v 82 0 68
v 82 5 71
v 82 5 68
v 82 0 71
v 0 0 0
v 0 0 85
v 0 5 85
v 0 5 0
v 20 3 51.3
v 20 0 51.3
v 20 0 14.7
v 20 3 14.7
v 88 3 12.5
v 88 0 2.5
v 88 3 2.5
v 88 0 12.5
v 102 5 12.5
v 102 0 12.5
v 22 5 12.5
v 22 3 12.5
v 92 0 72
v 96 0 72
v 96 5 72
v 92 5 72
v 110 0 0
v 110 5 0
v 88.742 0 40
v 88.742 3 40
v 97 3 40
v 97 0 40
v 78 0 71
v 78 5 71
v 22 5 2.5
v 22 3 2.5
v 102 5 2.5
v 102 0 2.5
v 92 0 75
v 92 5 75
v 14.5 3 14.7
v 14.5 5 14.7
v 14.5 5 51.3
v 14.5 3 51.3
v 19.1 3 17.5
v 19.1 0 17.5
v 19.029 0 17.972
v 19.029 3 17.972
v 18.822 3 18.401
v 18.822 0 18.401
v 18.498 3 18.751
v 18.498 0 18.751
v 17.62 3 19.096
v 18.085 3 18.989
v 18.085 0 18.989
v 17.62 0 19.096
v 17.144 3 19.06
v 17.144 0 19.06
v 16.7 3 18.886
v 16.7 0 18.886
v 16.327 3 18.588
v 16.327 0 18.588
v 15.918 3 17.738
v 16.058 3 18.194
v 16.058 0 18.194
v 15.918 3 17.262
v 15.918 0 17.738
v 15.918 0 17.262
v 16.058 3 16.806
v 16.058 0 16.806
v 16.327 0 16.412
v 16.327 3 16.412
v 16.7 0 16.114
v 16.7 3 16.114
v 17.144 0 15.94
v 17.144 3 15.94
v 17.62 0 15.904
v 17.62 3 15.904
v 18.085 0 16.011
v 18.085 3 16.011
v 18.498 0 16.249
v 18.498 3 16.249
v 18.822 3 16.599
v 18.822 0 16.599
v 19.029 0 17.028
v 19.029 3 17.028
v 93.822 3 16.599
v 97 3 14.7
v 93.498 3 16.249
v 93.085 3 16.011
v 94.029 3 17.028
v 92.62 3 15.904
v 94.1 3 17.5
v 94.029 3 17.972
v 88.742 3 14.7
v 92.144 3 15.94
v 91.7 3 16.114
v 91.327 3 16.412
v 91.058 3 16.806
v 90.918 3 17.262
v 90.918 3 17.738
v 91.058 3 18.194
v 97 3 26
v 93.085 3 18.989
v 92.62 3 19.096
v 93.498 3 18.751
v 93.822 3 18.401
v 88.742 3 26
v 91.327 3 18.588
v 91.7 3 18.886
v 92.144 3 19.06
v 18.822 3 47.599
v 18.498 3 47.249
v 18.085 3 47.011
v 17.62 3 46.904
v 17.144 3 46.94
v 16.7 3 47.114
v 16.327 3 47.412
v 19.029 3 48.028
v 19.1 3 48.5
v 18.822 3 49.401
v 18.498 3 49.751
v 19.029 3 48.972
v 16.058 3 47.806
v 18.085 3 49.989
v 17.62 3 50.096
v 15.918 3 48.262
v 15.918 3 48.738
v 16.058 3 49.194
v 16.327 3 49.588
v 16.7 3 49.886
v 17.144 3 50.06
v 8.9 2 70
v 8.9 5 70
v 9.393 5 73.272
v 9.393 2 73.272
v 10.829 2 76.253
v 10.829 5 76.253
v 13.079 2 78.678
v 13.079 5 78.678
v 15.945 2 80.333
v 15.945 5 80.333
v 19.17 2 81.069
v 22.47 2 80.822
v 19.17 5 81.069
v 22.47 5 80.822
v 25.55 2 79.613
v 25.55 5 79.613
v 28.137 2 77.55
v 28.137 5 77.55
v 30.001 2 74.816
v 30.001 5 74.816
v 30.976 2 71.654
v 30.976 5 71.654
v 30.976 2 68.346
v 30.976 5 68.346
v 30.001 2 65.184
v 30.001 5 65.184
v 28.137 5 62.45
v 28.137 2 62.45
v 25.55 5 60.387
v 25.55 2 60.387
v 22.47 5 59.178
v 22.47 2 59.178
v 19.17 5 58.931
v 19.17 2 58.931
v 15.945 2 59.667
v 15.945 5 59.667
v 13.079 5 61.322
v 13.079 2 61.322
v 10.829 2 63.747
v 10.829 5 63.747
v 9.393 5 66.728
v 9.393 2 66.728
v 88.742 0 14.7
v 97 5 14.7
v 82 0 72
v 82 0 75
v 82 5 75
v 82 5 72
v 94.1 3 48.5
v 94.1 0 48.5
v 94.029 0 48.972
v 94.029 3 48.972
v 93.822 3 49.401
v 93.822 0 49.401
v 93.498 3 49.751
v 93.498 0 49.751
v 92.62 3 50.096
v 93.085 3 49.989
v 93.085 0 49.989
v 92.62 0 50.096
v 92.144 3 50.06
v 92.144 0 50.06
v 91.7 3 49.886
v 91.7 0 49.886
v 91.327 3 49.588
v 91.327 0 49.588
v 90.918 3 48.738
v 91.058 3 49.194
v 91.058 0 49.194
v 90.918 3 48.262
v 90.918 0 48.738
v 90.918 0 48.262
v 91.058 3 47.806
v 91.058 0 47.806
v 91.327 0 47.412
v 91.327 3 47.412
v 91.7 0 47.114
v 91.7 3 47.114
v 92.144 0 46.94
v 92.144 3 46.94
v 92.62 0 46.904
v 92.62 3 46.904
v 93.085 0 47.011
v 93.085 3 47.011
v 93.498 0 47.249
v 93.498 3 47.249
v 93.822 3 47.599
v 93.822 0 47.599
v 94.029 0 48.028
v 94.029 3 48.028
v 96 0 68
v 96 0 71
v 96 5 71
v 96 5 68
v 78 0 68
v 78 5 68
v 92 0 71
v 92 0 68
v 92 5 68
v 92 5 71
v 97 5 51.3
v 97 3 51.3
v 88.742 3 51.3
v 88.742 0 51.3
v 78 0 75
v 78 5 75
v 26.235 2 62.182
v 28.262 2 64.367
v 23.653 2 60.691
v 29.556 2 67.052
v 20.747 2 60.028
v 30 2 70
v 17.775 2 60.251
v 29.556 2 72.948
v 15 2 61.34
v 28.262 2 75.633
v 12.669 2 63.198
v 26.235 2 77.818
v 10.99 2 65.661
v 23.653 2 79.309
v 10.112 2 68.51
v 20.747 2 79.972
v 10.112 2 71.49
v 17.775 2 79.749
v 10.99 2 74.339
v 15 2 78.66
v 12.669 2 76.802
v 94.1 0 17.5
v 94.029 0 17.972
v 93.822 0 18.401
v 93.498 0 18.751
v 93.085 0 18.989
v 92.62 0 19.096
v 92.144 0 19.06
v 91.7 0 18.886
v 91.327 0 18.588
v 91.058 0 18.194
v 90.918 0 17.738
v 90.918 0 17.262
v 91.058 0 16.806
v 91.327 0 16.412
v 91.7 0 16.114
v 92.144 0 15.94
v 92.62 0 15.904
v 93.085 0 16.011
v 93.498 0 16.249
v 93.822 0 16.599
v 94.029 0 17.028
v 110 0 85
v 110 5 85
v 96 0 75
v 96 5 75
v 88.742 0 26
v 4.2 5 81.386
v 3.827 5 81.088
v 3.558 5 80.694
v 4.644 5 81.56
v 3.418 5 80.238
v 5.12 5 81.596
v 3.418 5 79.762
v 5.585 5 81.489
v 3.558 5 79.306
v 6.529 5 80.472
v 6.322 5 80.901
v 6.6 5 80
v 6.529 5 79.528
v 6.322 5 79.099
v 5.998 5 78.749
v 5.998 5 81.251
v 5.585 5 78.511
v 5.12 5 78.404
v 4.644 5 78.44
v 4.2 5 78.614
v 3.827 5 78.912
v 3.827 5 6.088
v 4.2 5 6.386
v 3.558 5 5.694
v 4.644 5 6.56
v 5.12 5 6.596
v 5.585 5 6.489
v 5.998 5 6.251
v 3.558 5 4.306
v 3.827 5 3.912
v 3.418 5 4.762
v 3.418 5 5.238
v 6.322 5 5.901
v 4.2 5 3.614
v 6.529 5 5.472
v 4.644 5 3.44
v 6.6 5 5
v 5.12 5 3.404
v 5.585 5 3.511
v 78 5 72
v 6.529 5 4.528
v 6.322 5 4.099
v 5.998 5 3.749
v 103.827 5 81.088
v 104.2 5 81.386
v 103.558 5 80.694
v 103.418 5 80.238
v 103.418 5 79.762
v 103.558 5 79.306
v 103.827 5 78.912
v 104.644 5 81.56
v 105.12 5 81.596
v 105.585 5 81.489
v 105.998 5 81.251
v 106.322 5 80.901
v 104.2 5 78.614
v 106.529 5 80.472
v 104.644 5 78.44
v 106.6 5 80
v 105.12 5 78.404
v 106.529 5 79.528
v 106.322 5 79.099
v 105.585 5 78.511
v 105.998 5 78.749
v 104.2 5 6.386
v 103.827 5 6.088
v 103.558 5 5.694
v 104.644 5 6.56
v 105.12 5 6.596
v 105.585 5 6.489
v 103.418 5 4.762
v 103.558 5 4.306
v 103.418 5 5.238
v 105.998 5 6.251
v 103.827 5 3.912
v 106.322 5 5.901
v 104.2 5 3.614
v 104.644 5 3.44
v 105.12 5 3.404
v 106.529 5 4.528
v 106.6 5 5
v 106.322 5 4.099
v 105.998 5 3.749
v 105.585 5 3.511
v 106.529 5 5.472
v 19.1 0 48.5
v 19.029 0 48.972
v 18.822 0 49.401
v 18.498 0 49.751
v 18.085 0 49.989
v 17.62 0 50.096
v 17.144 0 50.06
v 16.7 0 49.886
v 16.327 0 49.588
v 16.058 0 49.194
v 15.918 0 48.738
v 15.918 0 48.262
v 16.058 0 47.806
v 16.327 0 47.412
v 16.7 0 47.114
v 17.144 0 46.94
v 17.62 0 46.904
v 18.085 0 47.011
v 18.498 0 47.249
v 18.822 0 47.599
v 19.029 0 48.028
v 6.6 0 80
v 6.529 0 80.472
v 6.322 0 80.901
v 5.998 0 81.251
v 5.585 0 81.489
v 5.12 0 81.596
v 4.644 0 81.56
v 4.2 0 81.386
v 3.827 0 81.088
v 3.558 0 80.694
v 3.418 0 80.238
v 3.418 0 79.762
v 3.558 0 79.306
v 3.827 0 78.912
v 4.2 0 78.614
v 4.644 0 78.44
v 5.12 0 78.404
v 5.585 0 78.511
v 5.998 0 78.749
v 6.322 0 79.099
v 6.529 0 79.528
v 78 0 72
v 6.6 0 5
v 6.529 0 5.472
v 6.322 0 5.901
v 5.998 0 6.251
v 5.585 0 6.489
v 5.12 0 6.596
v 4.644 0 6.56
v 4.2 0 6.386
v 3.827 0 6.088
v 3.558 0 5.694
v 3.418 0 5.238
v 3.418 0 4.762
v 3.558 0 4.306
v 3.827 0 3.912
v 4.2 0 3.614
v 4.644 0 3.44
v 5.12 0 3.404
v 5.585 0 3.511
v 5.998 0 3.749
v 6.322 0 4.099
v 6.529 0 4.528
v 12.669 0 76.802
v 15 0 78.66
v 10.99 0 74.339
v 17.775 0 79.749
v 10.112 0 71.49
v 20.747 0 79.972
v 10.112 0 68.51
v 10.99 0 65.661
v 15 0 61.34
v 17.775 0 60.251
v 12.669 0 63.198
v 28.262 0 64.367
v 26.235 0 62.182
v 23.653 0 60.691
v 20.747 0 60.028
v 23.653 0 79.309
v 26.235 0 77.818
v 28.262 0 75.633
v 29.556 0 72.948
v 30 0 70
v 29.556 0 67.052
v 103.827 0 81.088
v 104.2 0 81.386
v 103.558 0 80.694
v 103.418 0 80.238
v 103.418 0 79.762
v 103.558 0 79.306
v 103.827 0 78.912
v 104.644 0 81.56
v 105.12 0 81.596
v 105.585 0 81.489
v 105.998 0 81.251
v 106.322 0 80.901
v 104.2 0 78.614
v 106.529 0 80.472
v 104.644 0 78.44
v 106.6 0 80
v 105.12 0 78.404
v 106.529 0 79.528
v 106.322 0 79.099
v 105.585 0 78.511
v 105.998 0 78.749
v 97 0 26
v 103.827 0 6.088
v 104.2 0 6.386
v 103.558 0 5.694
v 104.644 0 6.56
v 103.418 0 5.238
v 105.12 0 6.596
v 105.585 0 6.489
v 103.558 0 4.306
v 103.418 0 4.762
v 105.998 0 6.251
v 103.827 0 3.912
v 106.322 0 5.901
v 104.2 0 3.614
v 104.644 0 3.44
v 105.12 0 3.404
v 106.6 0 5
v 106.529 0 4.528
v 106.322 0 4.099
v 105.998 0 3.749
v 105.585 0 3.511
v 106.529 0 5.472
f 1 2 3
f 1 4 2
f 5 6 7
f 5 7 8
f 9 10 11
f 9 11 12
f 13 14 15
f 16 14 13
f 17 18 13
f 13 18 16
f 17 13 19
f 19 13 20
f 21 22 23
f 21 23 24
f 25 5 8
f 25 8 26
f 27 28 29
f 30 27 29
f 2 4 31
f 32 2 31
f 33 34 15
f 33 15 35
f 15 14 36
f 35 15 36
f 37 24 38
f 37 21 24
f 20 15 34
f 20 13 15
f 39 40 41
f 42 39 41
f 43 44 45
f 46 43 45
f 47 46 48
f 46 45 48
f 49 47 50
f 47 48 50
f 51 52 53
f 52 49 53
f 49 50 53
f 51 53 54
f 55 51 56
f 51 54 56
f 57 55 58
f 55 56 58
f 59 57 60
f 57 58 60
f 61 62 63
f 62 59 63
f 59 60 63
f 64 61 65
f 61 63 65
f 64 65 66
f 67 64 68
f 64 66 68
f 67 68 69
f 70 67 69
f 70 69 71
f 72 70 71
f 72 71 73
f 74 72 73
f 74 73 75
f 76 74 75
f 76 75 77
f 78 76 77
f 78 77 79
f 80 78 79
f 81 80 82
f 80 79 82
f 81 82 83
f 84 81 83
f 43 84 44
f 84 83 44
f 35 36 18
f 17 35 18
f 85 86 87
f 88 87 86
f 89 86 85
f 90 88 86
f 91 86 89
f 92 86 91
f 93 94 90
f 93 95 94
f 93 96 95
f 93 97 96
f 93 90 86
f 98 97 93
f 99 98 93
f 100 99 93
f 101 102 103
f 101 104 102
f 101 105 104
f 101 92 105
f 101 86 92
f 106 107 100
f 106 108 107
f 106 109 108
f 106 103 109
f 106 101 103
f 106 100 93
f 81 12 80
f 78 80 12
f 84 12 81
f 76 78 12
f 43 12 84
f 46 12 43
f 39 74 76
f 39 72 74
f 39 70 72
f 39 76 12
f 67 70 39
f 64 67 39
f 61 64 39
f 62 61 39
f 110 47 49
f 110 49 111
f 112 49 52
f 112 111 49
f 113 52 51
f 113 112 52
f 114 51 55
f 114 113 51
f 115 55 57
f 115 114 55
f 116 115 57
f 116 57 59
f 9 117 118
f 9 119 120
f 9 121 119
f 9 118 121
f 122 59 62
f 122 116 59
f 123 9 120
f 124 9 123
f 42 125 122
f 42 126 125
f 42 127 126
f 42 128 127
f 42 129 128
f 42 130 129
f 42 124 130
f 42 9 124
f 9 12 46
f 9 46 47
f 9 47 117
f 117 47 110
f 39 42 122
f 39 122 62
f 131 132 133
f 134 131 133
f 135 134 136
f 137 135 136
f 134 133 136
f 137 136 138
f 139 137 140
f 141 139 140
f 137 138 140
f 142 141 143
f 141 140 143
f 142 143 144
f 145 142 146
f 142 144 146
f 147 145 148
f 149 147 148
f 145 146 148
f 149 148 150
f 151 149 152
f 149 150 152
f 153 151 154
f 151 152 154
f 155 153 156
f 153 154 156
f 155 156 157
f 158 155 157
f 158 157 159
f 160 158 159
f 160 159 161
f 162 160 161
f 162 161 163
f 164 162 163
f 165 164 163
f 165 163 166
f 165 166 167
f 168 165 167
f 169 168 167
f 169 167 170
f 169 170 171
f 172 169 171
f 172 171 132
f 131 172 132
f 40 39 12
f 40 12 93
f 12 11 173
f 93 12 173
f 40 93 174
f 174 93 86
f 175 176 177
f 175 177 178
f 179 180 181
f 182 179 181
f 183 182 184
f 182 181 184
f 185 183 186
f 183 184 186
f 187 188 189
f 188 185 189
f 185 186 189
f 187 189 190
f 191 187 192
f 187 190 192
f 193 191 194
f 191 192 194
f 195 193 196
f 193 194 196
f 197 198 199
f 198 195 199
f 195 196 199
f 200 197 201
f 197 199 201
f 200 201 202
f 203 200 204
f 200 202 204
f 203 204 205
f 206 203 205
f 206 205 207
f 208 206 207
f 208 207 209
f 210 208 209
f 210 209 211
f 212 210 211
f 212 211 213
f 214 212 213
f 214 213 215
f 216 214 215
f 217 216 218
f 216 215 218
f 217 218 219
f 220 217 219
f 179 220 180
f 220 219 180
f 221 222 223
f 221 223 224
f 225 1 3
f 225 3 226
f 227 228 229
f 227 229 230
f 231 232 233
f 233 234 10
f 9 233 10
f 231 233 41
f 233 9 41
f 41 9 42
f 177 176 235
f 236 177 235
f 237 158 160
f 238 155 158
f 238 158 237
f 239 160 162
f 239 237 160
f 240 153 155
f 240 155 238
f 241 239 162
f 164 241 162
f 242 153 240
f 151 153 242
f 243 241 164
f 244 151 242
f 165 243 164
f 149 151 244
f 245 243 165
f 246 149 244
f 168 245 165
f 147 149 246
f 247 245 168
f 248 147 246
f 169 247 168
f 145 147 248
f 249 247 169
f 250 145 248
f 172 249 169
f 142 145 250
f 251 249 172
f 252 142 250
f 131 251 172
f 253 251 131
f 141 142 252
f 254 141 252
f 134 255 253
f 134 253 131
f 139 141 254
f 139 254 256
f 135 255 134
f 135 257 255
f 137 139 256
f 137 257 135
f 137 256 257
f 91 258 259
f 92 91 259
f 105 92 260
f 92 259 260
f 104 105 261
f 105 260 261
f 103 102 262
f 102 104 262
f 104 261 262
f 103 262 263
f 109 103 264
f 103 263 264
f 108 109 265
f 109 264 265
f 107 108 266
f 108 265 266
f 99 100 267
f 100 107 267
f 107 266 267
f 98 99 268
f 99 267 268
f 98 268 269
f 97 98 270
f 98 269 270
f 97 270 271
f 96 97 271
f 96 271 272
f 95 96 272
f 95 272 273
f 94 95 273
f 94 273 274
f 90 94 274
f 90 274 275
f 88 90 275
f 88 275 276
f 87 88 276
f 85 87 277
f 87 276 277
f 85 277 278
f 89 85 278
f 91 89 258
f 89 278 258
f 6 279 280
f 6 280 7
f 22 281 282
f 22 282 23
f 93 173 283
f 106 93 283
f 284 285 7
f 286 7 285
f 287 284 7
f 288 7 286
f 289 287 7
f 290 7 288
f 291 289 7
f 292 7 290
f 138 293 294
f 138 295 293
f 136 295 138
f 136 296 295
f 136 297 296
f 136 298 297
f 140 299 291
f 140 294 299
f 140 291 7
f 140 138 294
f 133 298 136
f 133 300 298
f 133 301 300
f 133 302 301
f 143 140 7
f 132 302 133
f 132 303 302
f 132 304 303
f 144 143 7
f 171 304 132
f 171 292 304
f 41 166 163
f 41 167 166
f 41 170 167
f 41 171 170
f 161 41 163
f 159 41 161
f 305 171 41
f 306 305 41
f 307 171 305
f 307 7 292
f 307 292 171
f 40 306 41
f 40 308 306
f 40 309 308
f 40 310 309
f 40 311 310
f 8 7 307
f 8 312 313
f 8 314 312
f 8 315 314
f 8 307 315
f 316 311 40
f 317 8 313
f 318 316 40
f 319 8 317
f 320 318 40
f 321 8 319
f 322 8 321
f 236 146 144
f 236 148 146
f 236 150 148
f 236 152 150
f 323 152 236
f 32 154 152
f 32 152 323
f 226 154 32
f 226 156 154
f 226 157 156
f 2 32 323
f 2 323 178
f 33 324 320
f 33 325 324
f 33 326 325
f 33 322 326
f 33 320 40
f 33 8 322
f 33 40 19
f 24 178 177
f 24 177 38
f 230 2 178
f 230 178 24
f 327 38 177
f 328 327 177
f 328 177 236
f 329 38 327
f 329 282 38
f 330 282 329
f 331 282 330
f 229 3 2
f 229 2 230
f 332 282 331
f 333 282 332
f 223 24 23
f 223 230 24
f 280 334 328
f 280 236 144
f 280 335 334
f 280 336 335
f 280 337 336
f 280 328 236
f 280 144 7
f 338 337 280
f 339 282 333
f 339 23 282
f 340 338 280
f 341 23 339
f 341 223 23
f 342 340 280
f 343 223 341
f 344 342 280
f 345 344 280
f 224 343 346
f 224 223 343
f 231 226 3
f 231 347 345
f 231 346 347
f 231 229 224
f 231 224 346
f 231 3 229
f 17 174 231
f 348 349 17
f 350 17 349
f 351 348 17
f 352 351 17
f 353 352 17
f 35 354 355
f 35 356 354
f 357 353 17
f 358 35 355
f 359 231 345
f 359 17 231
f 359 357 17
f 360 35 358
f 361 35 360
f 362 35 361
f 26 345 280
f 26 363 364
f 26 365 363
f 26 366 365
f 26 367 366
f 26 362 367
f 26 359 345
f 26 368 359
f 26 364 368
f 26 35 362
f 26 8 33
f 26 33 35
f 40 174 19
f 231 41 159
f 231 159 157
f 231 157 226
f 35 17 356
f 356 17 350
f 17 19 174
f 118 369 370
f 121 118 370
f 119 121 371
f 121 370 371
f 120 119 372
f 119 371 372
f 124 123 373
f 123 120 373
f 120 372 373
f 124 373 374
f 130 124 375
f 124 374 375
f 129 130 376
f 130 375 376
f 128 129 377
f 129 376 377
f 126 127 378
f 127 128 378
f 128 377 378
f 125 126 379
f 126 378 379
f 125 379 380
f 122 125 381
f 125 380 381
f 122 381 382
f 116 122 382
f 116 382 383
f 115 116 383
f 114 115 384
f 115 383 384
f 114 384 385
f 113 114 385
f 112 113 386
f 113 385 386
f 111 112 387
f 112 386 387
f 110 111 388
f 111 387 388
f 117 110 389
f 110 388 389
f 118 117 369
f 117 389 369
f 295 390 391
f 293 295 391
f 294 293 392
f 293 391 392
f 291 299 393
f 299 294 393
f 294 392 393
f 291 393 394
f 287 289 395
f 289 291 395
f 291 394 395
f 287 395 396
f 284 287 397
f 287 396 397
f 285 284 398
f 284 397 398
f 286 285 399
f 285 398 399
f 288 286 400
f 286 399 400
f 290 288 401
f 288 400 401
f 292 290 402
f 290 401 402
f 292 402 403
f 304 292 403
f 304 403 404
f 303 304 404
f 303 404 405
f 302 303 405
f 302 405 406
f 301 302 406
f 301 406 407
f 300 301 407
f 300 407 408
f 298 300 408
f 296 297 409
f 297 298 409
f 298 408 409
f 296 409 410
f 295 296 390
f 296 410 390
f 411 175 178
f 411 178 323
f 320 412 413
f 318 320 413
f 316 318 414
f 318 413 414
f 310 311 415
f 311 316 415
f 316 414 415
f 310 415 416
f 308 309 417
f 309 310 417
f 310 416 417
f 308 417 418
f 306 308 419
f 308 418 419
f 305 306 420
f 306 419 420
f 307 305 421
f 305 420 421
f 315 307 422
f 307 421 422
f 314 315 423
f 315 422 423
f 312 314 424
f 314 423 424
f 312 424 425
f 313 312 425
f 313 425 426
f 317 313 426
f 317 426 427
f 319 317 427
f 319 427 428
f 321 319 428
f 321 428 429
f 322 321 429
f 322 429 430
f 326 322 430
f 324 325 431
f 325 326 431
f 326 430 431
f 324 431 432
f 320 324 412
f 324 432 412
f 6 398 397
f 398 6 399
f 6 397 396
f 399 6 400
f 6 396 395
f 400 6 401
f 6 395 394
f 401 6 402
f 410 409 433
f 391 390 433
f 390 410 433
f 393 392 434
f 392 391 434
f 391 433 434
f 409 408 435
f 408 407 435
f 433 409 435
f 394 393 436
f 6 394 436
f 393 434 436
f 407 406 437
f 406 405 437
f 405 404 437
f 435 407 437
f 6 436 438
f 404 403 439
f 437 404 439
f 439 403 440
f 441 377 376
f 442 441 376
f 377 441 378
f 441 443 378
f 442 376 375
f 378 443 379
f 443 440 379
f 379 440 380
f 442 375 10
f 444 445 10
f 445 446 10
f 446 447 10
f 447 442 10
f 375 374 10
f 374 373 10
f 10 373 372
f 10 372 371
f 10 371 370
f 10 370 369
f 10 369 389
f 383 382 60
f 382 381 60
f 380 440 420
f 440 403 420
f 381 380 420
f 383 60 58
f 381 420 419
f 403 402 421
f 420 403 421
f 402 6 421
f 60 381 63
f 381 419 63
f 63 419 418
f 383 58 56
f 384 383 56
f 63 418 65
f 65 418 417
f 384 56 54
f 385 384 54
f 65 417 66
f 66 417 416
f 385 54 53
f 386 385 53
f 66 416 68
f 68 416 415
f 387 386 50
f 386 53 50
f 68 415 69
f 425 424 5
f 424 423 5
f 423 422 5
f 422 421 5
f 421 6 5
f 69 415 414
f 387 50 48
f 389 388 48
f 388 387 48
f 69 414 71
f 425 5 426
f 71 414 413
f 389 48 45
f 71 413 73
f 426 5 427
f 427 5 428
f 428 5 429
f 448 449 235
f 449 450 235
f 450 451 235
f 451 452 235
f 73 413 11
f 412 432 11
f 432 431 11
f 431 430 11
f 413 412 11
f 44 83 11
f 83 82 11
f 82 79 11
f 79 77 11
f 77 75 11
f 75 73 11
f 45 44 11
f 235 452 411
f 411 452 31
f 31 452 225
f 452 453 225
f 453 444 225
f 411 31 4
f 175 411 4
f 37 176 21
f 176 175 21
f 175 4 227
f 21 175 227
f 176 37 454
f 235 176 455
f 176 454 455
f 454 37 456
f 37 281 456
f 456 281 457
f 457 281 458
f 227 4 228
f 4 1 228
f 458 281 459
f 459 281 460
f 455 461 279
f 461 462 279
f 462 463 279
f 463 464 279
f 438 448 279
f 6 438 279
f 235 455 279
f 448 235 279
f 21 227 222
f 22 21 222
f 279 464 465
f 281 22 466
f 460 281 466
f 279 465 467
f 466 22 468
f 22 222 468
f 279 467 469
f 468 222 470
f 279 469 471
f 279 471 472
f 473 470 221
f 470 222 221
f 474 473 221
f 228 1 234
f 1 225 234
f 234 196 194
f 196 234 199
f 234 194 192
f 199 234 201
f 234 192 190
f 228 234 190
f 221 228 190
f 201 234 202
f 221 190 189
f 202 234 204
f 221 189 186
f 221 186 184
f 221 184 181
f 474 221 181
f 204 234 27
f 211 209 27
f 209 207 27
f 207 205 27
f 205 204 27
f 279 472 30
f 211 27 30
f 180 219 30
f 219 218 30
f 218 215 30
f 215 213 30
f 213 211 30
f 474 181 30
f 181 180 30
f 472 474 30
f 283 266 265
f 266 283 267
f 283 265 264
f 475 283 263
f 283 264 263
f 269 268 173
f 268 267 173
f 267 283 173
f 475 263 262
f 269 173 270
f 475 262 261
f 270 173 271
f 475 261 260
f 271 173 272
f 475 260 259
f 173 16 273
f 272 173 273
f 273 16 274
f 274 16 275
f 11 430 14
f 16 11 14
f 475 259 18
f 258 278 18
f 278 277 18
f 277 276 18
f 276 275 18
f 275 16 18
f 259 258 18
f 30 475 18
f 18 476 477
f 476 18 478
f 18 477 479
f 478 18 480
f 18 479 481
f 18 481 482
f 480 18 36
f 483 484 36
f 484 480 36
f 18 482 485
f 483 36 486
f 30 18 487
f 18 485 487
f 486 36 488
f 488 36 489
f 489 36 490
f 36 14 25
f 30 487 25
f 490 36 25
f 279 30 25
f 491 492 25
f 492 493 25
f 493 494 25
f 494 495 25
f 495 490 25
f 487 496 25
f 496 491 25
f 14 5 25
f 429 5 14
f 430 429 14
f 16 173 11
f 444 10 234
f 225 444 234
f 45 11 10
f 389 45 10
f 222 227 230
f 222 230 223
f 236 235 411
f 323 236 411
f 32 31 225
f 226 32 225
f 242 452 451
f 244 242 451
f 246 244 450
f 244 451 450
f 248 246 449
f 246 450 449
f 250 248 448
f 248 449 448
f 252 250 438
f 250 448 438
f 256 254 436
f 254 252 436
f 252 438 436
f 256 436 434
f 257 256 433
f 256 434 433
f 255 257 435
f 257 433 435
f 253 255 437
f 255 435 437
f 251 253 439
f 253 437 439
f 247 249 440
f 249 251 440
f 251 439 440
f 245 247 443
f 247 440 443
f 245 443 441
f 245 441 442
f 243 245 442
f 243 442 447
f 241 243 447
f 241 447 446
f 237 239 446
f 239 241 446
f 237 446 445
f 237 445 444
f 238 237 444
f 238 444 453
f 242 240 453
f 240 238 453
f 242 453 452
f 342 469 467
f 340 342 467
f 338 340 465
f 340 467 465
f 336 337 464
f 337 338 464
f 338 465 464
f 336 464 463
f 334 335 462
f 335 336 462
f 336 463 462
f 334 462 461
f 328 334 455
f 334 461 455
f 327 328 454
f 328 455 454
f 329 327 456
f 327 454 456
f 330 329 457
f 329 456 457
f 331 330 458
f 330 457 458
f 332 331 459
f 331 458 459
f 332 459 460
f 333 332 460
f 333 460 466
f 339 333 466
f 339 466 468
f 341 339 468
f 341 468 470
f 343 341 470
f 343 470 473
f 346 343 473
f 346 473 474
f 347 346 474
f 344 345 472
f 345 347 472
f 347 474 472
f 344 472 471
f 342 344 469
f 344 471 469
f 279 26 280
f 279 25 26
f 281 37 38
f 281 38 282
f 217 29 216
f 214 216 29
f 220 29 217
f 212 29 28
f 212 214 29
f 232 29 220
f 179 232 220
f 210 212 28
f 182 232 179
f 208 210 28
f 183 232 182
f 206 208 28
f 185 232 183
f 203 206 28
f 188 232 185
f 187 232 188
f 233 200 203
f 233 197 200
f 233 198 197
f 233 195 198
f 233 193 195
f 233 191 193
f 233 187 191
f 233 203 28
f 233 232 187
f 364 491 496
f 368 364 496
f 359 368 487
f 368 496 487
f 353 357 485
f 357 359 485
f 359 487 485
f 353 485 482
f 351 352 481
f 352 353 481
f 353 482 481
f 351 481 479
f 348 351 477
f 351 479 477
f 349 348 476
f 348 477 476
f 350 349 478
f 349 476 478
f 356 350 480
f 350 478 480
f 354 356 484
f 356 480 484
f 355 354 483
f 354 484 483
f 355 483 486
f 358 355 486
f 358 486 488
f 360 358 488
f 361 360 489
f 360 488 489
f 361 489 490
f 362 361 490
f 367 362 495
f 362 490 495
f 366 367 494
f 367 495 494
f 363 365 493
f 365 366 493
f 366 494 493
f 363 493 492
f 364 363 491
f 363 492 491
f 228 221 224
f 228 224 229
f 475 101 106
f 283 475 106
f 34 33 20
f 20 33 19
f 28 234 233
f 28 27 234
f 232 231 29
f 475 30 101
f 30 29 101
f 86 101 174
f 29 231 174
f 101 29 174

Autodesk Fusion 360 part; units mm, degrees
sketch "Sketch1" plane through (0, 0, 0) normal (0, 1, 0) x (1, 0, 0) in component "mountingPlatee"
  line L0 (0, 0) -> (110, 0)
  line L1 (110, 0) -> (110, -85)
  line L2 (110, -85) -> (0, -85)
  line L3 (0, -85) -> (0, 0)
  line L4 (15, -15) -> (95, -15)
  line L5 (95, -15) -> (95, -51)
  line L6 (95, -51) -> (15, -51)
  line L7 (15, -51) -> (15, -15)
  line L8 (15, -15) -> (15, -17.5)
  circle A0 centre (17.5, -17.5) radius 1.6
  line L9 (15, -51) -> (17.5, -51)
  line L10 (15, -48.5) -> (15, -51)
  circle A1 centre (17.5, -48.5) radius 1.6
  circle A2 centre (92.5, -48.5) radius 1.6
  circle A3 centre (92.5, -17.5) radius 1.6
  line L11 (15, -15) -> (20, -15)
  line L12 (20, -15) -> (20, -51)
  line L13 (20, -51) -> (15, -51)
  line L14 (15, -51) -> (15, -15)
  line L15 (95, -15) -> (88.7416, -15)
  line L16 (88.7416, -15) -> (88.7416, -51)
  line L17 (88.7416, -51) -> (95, -51)
  line L18 (95, -51) -> (95, -15)
  line L19 (22, -2.5) -> (88, -2.5)
  line L20 (88, -2.5) -> (88, -12.5)
  line L21 (88, -12.5) -> (22, -12.5)
  line L22 (22, -12.5) -> (22, -2.5)
  circle A4 centre (20, -70) radius 10
  circle A5 centre (5, -80) radius 1.6
  circle A6 centre (5, -5) radius 1.6
  circle A7 centre (105, -5) radius 1.6
  circle A8 centre (105, -80) radius 1.6
  line L23 (95, -68) -> (92, -68)
  line L24 (95, -75) -> (92, -75)
  line L25 (92, -71) -> (95, -71)
  line L26 (95, -72) -> (92, -72)
  line L27 (82, -68) -> (79, -68)
  line L28 (79, -71) -> (82, -71)
  line L29 (82, -71) -> (82, -68)
  line L30 (82, -72) -> (79, -72)
  line L31 (79, -75) -> (82, -75)
  line L32 (82, -75) -> (82, -72)
  line L33 (88, -2.5) -> (102, -2.5)
  line L34 (102, -2.5) -> (102, -12.5)
  line L35 (102, -12.5) -> (88, -12.5)
  line L36 (88, -12.5) -> (88, -2.5)
  circle A9 centre (20, -70) radius 11.1
  line L37 (92, -75) -> (96, -75)
  line L38 (96, -75) -> (96, -72)
  line L39 (96, -72) -> (92, -72)
  line L40 (92, -72) -> (92, -75)
  line L41 (92, -71) -> (96, -71)
  line L42 (96, -71) -> (96, -68)
  line L43 (96, -68) -> (92, -68)
  line L44 (92, -68) -> (92, -71)
  line L45 (82, -75) -> (78, -75)
  line L46 (78, -75) -> (78, -72)
  line L47 (78, -72) -> (82, -72)
  line L48 (82, -72) -> (82, -75)
  line L49 (82, -71) -> (78, -71)
  line L50 (78, -71) -> (78, -68)
  line L51 (78, -68) -> (82, -68)
  line L52 (82, -68) -> (82, -71)
  dimension "d3" = 110
  dimension "d4" = 85
  dimension "d5" = 80
  dimension "d6" = 36
  dimension "d9" = 3.2
  dimension "d12" = 3.2
  dimension "d15" = 3.2
  dimension "d16" = 3.2
  dimension "d24" = 3.2
  dimension "d25" = 3.2
  dimension "d26" = 3.2
  dimension "d27" = 3.2
  dimension "d30" = 14
  dimension "d31" = 10
  dimension "d32" = 22.2
sketch "Sketch1 (2)" plane through (0, 0, 0) normal (0, 1, 0) x (1, 0, 0)
sketch "Sketch2" plane through (0, 0, 0) normal (0, 1, 0) x (1, 0, 0)
extrude "Extrude1" add sketch "Sketch1" along normal blind 5 contours L0 L1 L2 L3 | L4 L6 L7 L8 L9 L10 L11 L12 L13 L14 | L4 L5 L6 L15 L16 L17 L18 | L19 L20 L21 L22 L36 | A9
sketch "Sketch3" plane through (0, 5, 0) normal (0, 1, 0) x (-1, 0, 0)
  line L0 (-92, 75) -> (-92, 72)
  line L1 (-92, 72) -> (-96, 72)
  line L2 (-96, 72) -> (-96, 75)
  line L3 (-96, 75) -> (-92, 75)
  circle A0 centre (-5, 5) radius 1.6
  circle A1 centre (-17.5, 17.5) radius 1.6
  line L4 (-102, 12.5) -> (-88, 12.5)
  line L5 (-88, 12.5) -> (-88, 2.5)
  line L6 (-88, 2.5) -> (-102, 2.5)
  line L7 (-102, 2.5) -> (-102, 12.5)
  circle A2 centre (-105, 5) radius 1.6
  circle A3 centre (-105, 80) radius 1.6
  circle A4 centre (-17.5, 48.5) radius 1.6
  line L8 (-92, 71) -> (-92, 68)
  line L9 (-92, 68) -> (-96, 68)
  line L10 (-96, 68) -> (-96, 71)
  line L11 (-96, 71) -> (-92, 71)
  circle A5 centre (-5, 80) radius 1.6
  line L12 (-78, 68) -> (-82, 68)
  line L13 (-82, 68) -> (-82, 71)
  line L14 (-82, 71) -> (-78, 71)
  line L15 (-78, 71) -> (-78, 68)
  circle A6 centre (-92.5, 17.5) radius 1.6
  line L16 (-78, 72) -> (-82, 72)
  line L17 (-82, 72) -> (-82, 75)
  line L18 (-82, 75) -> (-78, 75)
  line L19 (-78, 75) -> (-78, 72)
  line L20 (-20, 51) -> (-20, 15)
  line L21 (-20, 15) -> (-88.7416, 15)
  line L22 (-88.7416, 15) -> (-88.7416, 51)
  line L23 (-88.7416, 51) -> (-20, 51)
  circle A7 centre (-92.5, 48.5) radius 1.6
  circle A8 centre (-20, 70) radius 10
  line L24 (0, 85) -> (-110, 85)
  line L25 (-110, 85) -> (-110, 0)
  line L26 (-110, 0) -> (0, 0)
  line L27 (0, 0) -> (0, 85)
  line L28 (-88, 2.5) -> (-22, 2.5)
  line L29 (-22, 2.5) -> (-22, 12.5)
  line L30 (-22, 12.5) -> (-88, 12.5)
  line L31 (-88, 12.5) -> (-88, 2.5)
  circle A9 centre (-20, 70) radius 11.1
  dimension "d35" = 66
  dimension "d36" = 22.2
extrude "Extrude2" cut sketch "Sketch3" against normal blind 2 contours L5 L28 L29 L30 L31 | A9
extrude "Extrude3" cut 1 faces at (30.692, 3, 70.5515) along direction (0, -1, 0) blind 1
sketch "Sketch4" plane through (0, 5, 0) normal (0, 1, 0) x (-1, 0, 0)
  line L0 (-22, 2.5) -> (-102, 2.5)
  line L1 (-102, 2.5) -> (-102, 12.5)
  line L2 (-102, 12.5) -> (-22, 12.5)
  line L3 (-22, 12.5) -> (-22, 2.5)
  circle A0 centre (-20, 70) radius 11.1
  line L4 (-92, 75) -> (-92, 72)
  line L5 (-92, 72) -> (-96, 72)
  line L6 (-96, 72) -> (-96, 75)
  line L7 (-96, 75) -> (-92, 75)
  circle A1 centre (-5, 5) radius 1.6
  circle A2 centre (-17.5, 17.5) radius 1.6
  circle A3 centre (-105, 5) radius 1.6
  circle A4 centre (-105, 80) radius 1.6
  circle A5 centre (-17.5, 48.5) radius 1.6
  line L8 (-92, 71) -> (-92, 68)
  line L9 (-92, 68) -> (-96, 68)
  line L10 (-96, 68) -> (-96, 71)
  line L11 (-96, 71) -> (-92, 71)
  circle A6 centre (-5, 80) radius 1.6
  line L12 (-78, 68) -> (-82, 68)
  line L13 (-82, 68) -> (-82, 71)
  line L14 (-82, 71) -> (-78, 71)
  line L15 (-78, 71) -> (-78, 68)
  circle A7 centre (-92.5, 17.5) radius 1.6
  line L16 (-78, 72) -> (-82, 72)
  line L17 (-82, 72) -> (-82, 75)
  line L18 (-82, 75) -> (-78, 75)
  line L19 (-78, 75) -> (-78, 72)
  line L20 (-20, 51) -> (-20, 15)
  line L21 (-20, 15) -> (-88.7416, 15)
  line L22 (-88.7416, 15) -> (-88.7416, 51)
  line L23 (-88.7416, 51) -> (-20, 51)
  circle A8 centre (-92.5, 48.5) radius 1.6
  line L24 (0, 85) -> (-110, 85)
  line L25 (-110, 85) -> (-110, 0)
  line L26 (-110, 0) -> (0, 0)
  line L27 (0, 0) -> (0, 85)
  line L28 (-20, 15) -> (-15, 15)
  line L29 (-15, 15) -> (-15, 51)
  line L30 (-15, 51) -> (-20, 51)
  line L31 (-20, 51) -> (-20, 15)
  line L32 (-88.7416, 15) -> (-96, 15)
  line L33 (-96, 15) -> (-96, 51)
  line L34 (-96, 51) -> (-88.7416, 51)
  line L35 (-88.7416, 51) -> (-88.7416, 15)
  line L36 (-88.7416, 51) -> (-88.7416, 40)
  line L37 (-88.7416, 40) -> (-96, 40)
  line L38 (-96, 40) -> (-96, 26)
  line L39 (-96, 26) -> (-88.7416, 26)
  line L40 (-88.7416, 26) -> (-88.7416, 40)
extrude "Extrude4" cut sketch "Sketch4" against normal blind 5 contours L22 L33 L35 L37 L38 L39 L40
sketch "Sketch5" plane through (0, 5, 0) normal (0, 1, 0) x (-1, 0, 0)
  line L0 (-96, 40) -> (-88.7416, 40)
  line L1 (-88.7416, 40) -> (-88.7416, 51)
  line L2 (-88.7416, 51) -> (-20, 51)
  line L3 (-20, 51) -> (-20, 15)
  line L4 (-20, 15) -> (-88.7416, 15)
  line L5 (-88.7416, 15) -> (-88.7416, 26)
  line L6 (-88.7416, 26) -> (-96, 26)
  line L7 (-96, 26) -> (-96, 40)
  line L8 (-22, 2.5) -> (-102, 2.5)
  line L9 (-102, 2.5) -> (-102, 12.5)
  line L10 (-102, 12.5) -> (-22, 12.5)
  line L11 (-22, 12.5) -> (-22, 2.5)
  circle A0 centre (-20, 70) radius 11.1
  line L12 (-92, 75) -> (-92, 72)
  line L13 (-92, 72) -> (-96, 72)
  line L14 (-96, 72) -> (-96, 75)
  line L15 (-96, 75) -> (-92, 75)
  circle A1 centre (-5, 5) radius 1.6
  circle A2 centre (-17.5, 17.5) radius 1.6
  circle A3 centre (-105, 5) radius 1.6
  circle A4 centre (-105, 80) radius 1.6
  circle A5 centre (-17.5, 48.5) radius 1.6
  line L16 (-92, 71) -> (-92, 68)
  line L17 (-92, 68) -> (-96, 68)
  line L18 (-96, 68) -> (-96, 71)
  line L19 (-96, 71) -> (-92, 71)
  circle A6 centre (-5, 80) radius 1.6
  line L20 (-78, 68) -> (-82, 68)
  line L21 (-82, 68) -> (-82, 71)
  line L22 (-82, 71) -> (-78, 71)
  line L23 (-78, 71) -> (-78, 68)
  circle A7 centre (-92.5, 17.5) radius 1.6
  line L24 (-78, 72) -> (-82, 72)
  line L25 (-82, 72) -> (-82, 75)
  line L26 (-82, 75) -> (-78, 75)
  line L27 (-78, 75) -> (-78, 72)
  circle A8 centre (-92.5, 48.5) radius 1.6
  line L28 (0, 85) -> (-110, 85)
  line L29 (-110, 85) -> (-110, 0)
  line L30 (-110, 0) -> (0, 0)
  line L31 (0, 0) -> (0, 85)
  line L32 (-20, 15) -> (-14.5, 15)
  line L33 (-14.5, 15) -> (-14.5, 51)
  line L34 (-14.5, 51) -> (-20, 51)
  line L35 (-20, 51) -> (-20, 15)
  line L36 (-88.7416, 15) -> (-97, 15)
  line L37 (-97, 15) -> (-97, 26)
  line L38 (-97, 26) -> (-88.7416, 26)
  line L39 (-88.7416, 26) -> (-88.7416, 15)
  line L40 (-88.7416, 40) -> (-97, 40)
  line L41 (-97, 40) -> (-97, 51)
  line L42 (-97, 51) -> (-88.7416, 51)
  line L43 (-88.7416, 51) -> (-88.7416, 40)
  dimension "d43" = 5.5
  dimension "d44" = 36
extrude "Extrude5" cut sketch "Sketch5" against normal blind 2 contours L0 L1 L40 L41 L42 L43 | L5 L6 L36 L37 L38 L39 | L3 L32 L33 L34 L35
sketch "Sketch6" plane through (0, 5, 0) normal (0, 1, 0) x (-1, 0, 0)
  line L0 (-14.5, 15) -> (-97, 15)
  line L1 (-97, 15) -> (-97, 26)
  line L2 (-97, 26) -> (-96, 26)
  line L3 (-96, 26) -> (-96, 40)
  line L4 (-96, 40) -> (-97, 40)
  line L5 (-97, 40) -> (-97, 51)
  line L6 (-97, 51) -> (-20, 51)
  line L7 (-20, 51) -> (-14.5, 51)
  line L8 (-14.5, 51) -> (-14.5, 15)
  line L9 (-22, 2.5) -> (-102, 2.5)
  line L10 (-102, 2.5) -> (-102, 12.5)
  line L11 (-102, 12.5) -> (-22, 12.5)
  line L12 (-22, 12.5) -> (-22, 2.5)
  circle A0 centre (-20, 70) radius 11.1
  line L13 (-92, 75) -> (-92, 72)
  line L14 (-92, 72) -> (-96, 72)
  line L15 (-96, 72) -> (-96, 75)
  line L16 (-96, 75) -> (-92, 75)
  circle A1 centre (-5, 5) radius 1.6
  circle A2 centre (-105, 5) radius 1.6
  circle A3 centre (-105, 80) radius 1.6
  line L17 (-92, 71) -> (-92, 68)
  line L18 (-92, 68) -> (-96, 68)
  line L19 (-96, 68) -> (-96, 71)
  line L20 (-96, 71) -> (-92, 71)
  circle A4 centre (-5, 80) radius 1.6
  line L21 (-78, 68) -> (-82, 68)
  line L22 (-82, 68) -> (-82, 71)
  line L23 (-82, 71) -> (-78, 71)
  line L24 (-78, 71) -> (-78, 68)
  line L25 (-78, 72) -> (-82, 72)
  line L26 (-82, 72) -> (-82, 75)
  line L27 (-82, 75) -> (-78, 75)
  line L28 (-78, 75) -> (-78, 72)
  line L29 (0, 85) -> (-110, 85)
  line L30 (-110, 85) -> (-110, 0)
  line L31 (-110, 0) -> (0, 0)
  line L32 (0, 0) -> (0, 85)
  line L33 (-97, 26) -> (-96, 26)
  line L34 (-96, 26) -> (-96, 40)
  line L35 (-96, 40) -> (-97, 40)
  line L36 (-97, 40) -> (-97, 26)
extrude "Extrude6" cut sketch "Sketch6" against normal blind 5 contours L2 L3 L4 L33 L34 L35 L36
extrude "Extrude7" cut 2 faces at (42.9139, 1, 51) (94.2472, 3.6667, 51) along direction (0, 0, 1) blind 0.3
extrude "Extrude8" cut 1 faces at (42.9139, 1, 15) along direction (0, 0, -1) blind 0.3
sketch "Sketch7" plane through (0, 5, 0) normal (0, 1, 0) x (-1, 0, 0)
  line L0 (-97, 14.7) -> (-97, 51.3)
  line L1 (-97, 51.3) -> (-20, 51.3)
  line L2 (-20, 51.3) -> (-14.5, 51.3)
  line L3 (-14.5, 51.3) -> (-14.5, 14.7)
  line L4 (-14.5, 14.7) -> (-97, 14.7)
  line L5 (0, 85) -> (-110, 85)
  line L6 (-110, 85) -> (-110, 0)
  line L7 (-110, 0) -> (0, 0)
  line L8 (0, 0) -> (0, 85)
  line L9 (-78, 72) -> (-82, 72)
  line L10 (-82, 72) -> (-82, 75)
  line L11 (-82, 75) -> (-78, 75)
  line L12 (-78, 75) -> (-78, 72)
  line L13 (-78, 68) -> (-82, 68)
  line L14 (-82, 68) -> (-82, 71)
  line L15 (-82, 71) -> (-78, 71)
  line L16 (-78, 71) -> (-78, 68)
  circle A0 centre (-5, 80) radius 1.6
  line L17 (-92, 71) -> (-92, 68)
  line L18 (-92, 68) -> (-96, 68)
  line L19 (-96, 68) -> (-96, 71)
  line L20 (-96, 71) -> (-92, 71)
  circle A1 centre (-105, 80) radius 1.6
  circle A2 centre (-105, 5) radius 1.6
  circle A3 centre (-5, 5) radius 1.6
  line L21 (-92, 75) -> (-92, 72)
  line L22 (-92, 72) -> (-96, 72)
  line L23 (-96, 72) -> (-96, 75)
  line L24 (-96, 75) -> (-92, 75)
  circle A4 centre (-20, 70) radius 11.1
  line L25 (-22, 2.5) -> (-102, 2.5)
  line L26 (-102, 2.5) -> (-102, 12.5)
  line L27 (-102, 12.5) -> (-22, 12.5)
  line L28 (-22, 12.5) -> (-22, 2.5)
component "mountingPlatee" placed x (1, 0, 0) y (0, 1, 0) z (0, 0, 1) at (0, 0, 0)
